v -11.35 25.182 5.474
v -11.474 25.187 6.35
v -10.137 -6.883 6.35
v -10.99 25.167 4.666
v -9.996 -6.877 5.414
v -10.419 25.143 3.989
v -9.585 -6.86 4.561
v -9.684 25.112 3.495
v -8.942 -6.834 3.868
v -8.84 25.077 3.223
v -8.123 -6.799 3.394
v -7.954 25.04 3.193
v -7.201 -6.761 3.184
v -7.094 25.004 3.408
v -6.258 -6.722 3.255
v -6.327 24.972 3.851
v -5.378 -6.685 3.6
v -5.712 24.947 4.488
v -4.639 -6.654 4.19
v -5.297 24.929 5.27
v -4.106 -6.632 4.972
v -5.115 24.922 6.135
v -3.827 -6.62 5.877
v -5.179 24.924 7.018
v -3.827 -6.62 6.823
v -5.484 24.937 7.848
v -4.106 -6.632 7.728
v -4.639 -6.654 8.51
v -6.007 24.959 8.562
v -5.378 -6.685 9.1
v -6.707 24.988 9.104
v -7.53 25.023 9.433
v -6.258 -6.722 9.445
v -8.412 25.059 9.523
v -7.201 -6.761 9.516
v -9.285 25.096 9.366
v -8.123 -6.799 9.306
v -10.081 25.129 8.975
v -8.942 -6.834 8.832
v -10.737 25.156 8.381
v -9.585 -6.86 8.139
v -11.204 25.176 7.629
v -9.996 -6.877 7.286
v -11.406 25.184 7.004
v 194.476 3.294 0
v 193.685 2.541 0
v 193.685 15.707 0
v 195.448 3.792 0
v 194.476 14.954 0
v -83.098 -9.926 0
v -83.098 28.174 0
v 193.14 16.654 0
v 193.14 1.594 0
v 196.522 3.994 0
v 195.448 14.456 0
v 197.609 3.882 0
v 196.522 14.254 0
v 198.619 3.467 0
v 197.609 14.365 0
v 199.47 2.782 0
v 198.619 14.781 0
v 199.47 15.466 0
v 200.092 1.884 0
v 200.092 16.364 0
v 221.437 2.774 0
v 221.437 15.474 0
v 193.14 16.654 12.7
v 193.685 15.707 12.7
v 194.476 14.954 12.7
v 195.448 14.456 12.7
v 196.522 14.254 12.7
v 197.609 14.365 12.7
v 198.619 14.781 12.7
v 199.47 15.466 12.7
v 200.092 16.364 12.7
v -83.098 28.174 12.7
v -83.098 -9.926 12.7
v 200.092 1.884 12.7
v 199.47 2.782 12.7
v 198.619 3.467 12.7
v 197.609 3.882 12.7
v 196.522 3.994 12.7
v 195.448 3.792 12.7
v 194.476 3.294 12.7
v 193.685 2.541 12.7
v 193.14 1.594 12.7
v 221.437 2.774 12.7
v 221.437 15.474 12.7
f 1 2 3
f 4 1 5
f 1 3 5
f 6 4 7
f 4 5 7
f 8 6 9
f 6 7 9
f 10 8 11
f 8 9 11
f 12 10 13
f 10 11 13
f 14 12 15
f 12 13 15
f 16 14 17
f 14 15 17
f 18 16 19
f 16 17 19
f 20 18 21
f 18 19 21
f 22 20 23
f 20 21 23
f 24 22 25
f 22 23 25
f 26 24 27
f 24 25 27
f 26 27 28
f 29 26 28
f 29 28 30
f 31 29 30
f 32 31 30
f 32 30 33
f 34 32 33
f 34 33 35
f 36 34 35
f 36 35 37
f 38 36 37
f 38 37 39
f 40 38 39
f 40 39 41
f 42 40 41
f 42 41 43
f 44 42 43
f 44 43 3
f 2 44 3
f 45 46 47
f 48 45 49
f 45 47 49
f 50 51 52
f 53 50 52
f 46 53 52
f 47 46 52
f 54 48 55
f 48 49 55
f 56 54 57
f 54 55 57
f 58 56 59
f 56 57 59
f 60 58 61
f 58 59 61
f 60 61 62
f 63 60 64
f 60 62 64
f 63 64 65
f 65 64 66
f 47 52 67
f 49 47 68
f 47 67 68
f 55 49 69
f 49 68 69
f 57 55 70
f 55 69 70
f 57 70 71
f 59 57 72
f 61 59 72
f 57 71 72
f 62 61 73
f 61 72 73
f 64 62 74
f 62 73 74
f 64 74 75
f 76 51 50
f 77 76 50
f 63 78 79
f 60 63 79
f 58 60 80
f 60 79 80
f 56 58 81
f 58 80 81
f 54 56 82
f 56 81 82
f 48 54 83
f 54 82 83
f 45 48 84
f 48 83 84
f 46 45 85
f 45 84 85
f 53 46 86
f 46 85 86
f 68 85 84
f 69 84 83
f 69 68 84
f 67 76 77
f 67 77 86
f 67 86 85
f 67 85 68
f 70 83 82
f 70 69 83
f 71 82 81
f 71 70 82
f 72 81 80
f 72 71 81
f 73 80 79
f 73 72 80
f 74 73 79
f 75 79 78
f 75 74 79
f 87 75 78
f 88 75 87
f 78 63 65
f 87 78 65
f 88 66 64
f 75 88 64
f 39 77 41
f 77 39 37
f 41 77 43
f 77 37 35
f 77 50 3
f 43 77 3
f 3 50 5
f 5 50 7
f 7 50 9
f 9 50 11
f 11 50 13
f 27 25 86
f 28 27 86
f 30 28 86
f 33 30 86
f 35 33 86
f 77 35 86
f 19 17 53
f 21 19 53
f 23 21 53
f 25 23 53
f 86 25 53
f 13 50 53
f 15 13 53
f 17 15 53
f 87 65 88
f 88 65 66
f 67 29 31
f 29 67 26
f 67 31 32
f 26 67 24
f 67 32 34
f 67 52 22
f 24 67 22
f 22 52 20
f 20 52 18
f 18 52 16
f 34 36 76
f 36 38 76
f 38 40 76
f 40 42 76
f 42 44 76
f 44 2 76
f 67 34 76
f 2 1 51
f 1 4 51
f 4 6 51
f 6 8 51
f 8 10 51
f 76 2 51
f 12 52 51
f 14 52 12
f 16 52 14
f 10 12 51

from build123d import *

# Parameters (mm, degrees)
F1_DEPTH = 12.7
F3_DEPTH = 25.4
F5_DEPTH = 50.8


with BuildPart() as f1:
    # F0 (on Top) → F1 (new body)
    with BuildSketch(Plane.XY):
        Polygon((221.4371956441, 15.4739474714), (-83.0981060863, 28.1739474714), (-83.0981060863, -9.9260525286), (221.4371956441, 2.7739474714), align=None)
    extrude(amount=F1_DEPTH)

    # F2 (on face) → F3 (cut)
    with BuildSketch(Plane.XY.offset(12.7)):
        with BuildLine():
            Line((200.0921744873, 16.3640963873), (193.1399459127, 16.6540243608))
            ThreePointArc((193.1399459127, 16.6540243608), (196.5220172711, 14.2539901577), (200.0921744873, 16.3640963873))
        make_face()
        with BuildLine():
            ThreePointArc((200.0921744873, 1.8837985555), (196.5220172711, 3.9939047851), (193.1399459127, 1.5938705819))
            Line((193.1399459127, 1.5938705819), (200.0921744873, 1.8837985555))
        make_face()
    extrude(amount=-F3_DEPTH, mode=Mode.SUBTRACT)

    # F4 (on face) → F5 (cut)
    with BuildSketch(Plane(origin=(0.2689588056, -6.4494055911, 0), x_dir=(0.9991315674, 0.0416666667, 0), z_dir=(0.0416666667, -0.9991315674, 0))):
        with BuildLine():
            ThreePointArc((-4.0645265004, 6.35), (-7.2395265004, 9.525), (-10.4145265004, 6.35))
            ThreePointArc((-10.4145265004, 6.35), (-7.2395265004, 3.175), (-4.0645265004, 6.35))
        make_face()
    extrude(amount=-F5_DEPTH, mode=Mode.SUBTRACT)


solid = f1.part
